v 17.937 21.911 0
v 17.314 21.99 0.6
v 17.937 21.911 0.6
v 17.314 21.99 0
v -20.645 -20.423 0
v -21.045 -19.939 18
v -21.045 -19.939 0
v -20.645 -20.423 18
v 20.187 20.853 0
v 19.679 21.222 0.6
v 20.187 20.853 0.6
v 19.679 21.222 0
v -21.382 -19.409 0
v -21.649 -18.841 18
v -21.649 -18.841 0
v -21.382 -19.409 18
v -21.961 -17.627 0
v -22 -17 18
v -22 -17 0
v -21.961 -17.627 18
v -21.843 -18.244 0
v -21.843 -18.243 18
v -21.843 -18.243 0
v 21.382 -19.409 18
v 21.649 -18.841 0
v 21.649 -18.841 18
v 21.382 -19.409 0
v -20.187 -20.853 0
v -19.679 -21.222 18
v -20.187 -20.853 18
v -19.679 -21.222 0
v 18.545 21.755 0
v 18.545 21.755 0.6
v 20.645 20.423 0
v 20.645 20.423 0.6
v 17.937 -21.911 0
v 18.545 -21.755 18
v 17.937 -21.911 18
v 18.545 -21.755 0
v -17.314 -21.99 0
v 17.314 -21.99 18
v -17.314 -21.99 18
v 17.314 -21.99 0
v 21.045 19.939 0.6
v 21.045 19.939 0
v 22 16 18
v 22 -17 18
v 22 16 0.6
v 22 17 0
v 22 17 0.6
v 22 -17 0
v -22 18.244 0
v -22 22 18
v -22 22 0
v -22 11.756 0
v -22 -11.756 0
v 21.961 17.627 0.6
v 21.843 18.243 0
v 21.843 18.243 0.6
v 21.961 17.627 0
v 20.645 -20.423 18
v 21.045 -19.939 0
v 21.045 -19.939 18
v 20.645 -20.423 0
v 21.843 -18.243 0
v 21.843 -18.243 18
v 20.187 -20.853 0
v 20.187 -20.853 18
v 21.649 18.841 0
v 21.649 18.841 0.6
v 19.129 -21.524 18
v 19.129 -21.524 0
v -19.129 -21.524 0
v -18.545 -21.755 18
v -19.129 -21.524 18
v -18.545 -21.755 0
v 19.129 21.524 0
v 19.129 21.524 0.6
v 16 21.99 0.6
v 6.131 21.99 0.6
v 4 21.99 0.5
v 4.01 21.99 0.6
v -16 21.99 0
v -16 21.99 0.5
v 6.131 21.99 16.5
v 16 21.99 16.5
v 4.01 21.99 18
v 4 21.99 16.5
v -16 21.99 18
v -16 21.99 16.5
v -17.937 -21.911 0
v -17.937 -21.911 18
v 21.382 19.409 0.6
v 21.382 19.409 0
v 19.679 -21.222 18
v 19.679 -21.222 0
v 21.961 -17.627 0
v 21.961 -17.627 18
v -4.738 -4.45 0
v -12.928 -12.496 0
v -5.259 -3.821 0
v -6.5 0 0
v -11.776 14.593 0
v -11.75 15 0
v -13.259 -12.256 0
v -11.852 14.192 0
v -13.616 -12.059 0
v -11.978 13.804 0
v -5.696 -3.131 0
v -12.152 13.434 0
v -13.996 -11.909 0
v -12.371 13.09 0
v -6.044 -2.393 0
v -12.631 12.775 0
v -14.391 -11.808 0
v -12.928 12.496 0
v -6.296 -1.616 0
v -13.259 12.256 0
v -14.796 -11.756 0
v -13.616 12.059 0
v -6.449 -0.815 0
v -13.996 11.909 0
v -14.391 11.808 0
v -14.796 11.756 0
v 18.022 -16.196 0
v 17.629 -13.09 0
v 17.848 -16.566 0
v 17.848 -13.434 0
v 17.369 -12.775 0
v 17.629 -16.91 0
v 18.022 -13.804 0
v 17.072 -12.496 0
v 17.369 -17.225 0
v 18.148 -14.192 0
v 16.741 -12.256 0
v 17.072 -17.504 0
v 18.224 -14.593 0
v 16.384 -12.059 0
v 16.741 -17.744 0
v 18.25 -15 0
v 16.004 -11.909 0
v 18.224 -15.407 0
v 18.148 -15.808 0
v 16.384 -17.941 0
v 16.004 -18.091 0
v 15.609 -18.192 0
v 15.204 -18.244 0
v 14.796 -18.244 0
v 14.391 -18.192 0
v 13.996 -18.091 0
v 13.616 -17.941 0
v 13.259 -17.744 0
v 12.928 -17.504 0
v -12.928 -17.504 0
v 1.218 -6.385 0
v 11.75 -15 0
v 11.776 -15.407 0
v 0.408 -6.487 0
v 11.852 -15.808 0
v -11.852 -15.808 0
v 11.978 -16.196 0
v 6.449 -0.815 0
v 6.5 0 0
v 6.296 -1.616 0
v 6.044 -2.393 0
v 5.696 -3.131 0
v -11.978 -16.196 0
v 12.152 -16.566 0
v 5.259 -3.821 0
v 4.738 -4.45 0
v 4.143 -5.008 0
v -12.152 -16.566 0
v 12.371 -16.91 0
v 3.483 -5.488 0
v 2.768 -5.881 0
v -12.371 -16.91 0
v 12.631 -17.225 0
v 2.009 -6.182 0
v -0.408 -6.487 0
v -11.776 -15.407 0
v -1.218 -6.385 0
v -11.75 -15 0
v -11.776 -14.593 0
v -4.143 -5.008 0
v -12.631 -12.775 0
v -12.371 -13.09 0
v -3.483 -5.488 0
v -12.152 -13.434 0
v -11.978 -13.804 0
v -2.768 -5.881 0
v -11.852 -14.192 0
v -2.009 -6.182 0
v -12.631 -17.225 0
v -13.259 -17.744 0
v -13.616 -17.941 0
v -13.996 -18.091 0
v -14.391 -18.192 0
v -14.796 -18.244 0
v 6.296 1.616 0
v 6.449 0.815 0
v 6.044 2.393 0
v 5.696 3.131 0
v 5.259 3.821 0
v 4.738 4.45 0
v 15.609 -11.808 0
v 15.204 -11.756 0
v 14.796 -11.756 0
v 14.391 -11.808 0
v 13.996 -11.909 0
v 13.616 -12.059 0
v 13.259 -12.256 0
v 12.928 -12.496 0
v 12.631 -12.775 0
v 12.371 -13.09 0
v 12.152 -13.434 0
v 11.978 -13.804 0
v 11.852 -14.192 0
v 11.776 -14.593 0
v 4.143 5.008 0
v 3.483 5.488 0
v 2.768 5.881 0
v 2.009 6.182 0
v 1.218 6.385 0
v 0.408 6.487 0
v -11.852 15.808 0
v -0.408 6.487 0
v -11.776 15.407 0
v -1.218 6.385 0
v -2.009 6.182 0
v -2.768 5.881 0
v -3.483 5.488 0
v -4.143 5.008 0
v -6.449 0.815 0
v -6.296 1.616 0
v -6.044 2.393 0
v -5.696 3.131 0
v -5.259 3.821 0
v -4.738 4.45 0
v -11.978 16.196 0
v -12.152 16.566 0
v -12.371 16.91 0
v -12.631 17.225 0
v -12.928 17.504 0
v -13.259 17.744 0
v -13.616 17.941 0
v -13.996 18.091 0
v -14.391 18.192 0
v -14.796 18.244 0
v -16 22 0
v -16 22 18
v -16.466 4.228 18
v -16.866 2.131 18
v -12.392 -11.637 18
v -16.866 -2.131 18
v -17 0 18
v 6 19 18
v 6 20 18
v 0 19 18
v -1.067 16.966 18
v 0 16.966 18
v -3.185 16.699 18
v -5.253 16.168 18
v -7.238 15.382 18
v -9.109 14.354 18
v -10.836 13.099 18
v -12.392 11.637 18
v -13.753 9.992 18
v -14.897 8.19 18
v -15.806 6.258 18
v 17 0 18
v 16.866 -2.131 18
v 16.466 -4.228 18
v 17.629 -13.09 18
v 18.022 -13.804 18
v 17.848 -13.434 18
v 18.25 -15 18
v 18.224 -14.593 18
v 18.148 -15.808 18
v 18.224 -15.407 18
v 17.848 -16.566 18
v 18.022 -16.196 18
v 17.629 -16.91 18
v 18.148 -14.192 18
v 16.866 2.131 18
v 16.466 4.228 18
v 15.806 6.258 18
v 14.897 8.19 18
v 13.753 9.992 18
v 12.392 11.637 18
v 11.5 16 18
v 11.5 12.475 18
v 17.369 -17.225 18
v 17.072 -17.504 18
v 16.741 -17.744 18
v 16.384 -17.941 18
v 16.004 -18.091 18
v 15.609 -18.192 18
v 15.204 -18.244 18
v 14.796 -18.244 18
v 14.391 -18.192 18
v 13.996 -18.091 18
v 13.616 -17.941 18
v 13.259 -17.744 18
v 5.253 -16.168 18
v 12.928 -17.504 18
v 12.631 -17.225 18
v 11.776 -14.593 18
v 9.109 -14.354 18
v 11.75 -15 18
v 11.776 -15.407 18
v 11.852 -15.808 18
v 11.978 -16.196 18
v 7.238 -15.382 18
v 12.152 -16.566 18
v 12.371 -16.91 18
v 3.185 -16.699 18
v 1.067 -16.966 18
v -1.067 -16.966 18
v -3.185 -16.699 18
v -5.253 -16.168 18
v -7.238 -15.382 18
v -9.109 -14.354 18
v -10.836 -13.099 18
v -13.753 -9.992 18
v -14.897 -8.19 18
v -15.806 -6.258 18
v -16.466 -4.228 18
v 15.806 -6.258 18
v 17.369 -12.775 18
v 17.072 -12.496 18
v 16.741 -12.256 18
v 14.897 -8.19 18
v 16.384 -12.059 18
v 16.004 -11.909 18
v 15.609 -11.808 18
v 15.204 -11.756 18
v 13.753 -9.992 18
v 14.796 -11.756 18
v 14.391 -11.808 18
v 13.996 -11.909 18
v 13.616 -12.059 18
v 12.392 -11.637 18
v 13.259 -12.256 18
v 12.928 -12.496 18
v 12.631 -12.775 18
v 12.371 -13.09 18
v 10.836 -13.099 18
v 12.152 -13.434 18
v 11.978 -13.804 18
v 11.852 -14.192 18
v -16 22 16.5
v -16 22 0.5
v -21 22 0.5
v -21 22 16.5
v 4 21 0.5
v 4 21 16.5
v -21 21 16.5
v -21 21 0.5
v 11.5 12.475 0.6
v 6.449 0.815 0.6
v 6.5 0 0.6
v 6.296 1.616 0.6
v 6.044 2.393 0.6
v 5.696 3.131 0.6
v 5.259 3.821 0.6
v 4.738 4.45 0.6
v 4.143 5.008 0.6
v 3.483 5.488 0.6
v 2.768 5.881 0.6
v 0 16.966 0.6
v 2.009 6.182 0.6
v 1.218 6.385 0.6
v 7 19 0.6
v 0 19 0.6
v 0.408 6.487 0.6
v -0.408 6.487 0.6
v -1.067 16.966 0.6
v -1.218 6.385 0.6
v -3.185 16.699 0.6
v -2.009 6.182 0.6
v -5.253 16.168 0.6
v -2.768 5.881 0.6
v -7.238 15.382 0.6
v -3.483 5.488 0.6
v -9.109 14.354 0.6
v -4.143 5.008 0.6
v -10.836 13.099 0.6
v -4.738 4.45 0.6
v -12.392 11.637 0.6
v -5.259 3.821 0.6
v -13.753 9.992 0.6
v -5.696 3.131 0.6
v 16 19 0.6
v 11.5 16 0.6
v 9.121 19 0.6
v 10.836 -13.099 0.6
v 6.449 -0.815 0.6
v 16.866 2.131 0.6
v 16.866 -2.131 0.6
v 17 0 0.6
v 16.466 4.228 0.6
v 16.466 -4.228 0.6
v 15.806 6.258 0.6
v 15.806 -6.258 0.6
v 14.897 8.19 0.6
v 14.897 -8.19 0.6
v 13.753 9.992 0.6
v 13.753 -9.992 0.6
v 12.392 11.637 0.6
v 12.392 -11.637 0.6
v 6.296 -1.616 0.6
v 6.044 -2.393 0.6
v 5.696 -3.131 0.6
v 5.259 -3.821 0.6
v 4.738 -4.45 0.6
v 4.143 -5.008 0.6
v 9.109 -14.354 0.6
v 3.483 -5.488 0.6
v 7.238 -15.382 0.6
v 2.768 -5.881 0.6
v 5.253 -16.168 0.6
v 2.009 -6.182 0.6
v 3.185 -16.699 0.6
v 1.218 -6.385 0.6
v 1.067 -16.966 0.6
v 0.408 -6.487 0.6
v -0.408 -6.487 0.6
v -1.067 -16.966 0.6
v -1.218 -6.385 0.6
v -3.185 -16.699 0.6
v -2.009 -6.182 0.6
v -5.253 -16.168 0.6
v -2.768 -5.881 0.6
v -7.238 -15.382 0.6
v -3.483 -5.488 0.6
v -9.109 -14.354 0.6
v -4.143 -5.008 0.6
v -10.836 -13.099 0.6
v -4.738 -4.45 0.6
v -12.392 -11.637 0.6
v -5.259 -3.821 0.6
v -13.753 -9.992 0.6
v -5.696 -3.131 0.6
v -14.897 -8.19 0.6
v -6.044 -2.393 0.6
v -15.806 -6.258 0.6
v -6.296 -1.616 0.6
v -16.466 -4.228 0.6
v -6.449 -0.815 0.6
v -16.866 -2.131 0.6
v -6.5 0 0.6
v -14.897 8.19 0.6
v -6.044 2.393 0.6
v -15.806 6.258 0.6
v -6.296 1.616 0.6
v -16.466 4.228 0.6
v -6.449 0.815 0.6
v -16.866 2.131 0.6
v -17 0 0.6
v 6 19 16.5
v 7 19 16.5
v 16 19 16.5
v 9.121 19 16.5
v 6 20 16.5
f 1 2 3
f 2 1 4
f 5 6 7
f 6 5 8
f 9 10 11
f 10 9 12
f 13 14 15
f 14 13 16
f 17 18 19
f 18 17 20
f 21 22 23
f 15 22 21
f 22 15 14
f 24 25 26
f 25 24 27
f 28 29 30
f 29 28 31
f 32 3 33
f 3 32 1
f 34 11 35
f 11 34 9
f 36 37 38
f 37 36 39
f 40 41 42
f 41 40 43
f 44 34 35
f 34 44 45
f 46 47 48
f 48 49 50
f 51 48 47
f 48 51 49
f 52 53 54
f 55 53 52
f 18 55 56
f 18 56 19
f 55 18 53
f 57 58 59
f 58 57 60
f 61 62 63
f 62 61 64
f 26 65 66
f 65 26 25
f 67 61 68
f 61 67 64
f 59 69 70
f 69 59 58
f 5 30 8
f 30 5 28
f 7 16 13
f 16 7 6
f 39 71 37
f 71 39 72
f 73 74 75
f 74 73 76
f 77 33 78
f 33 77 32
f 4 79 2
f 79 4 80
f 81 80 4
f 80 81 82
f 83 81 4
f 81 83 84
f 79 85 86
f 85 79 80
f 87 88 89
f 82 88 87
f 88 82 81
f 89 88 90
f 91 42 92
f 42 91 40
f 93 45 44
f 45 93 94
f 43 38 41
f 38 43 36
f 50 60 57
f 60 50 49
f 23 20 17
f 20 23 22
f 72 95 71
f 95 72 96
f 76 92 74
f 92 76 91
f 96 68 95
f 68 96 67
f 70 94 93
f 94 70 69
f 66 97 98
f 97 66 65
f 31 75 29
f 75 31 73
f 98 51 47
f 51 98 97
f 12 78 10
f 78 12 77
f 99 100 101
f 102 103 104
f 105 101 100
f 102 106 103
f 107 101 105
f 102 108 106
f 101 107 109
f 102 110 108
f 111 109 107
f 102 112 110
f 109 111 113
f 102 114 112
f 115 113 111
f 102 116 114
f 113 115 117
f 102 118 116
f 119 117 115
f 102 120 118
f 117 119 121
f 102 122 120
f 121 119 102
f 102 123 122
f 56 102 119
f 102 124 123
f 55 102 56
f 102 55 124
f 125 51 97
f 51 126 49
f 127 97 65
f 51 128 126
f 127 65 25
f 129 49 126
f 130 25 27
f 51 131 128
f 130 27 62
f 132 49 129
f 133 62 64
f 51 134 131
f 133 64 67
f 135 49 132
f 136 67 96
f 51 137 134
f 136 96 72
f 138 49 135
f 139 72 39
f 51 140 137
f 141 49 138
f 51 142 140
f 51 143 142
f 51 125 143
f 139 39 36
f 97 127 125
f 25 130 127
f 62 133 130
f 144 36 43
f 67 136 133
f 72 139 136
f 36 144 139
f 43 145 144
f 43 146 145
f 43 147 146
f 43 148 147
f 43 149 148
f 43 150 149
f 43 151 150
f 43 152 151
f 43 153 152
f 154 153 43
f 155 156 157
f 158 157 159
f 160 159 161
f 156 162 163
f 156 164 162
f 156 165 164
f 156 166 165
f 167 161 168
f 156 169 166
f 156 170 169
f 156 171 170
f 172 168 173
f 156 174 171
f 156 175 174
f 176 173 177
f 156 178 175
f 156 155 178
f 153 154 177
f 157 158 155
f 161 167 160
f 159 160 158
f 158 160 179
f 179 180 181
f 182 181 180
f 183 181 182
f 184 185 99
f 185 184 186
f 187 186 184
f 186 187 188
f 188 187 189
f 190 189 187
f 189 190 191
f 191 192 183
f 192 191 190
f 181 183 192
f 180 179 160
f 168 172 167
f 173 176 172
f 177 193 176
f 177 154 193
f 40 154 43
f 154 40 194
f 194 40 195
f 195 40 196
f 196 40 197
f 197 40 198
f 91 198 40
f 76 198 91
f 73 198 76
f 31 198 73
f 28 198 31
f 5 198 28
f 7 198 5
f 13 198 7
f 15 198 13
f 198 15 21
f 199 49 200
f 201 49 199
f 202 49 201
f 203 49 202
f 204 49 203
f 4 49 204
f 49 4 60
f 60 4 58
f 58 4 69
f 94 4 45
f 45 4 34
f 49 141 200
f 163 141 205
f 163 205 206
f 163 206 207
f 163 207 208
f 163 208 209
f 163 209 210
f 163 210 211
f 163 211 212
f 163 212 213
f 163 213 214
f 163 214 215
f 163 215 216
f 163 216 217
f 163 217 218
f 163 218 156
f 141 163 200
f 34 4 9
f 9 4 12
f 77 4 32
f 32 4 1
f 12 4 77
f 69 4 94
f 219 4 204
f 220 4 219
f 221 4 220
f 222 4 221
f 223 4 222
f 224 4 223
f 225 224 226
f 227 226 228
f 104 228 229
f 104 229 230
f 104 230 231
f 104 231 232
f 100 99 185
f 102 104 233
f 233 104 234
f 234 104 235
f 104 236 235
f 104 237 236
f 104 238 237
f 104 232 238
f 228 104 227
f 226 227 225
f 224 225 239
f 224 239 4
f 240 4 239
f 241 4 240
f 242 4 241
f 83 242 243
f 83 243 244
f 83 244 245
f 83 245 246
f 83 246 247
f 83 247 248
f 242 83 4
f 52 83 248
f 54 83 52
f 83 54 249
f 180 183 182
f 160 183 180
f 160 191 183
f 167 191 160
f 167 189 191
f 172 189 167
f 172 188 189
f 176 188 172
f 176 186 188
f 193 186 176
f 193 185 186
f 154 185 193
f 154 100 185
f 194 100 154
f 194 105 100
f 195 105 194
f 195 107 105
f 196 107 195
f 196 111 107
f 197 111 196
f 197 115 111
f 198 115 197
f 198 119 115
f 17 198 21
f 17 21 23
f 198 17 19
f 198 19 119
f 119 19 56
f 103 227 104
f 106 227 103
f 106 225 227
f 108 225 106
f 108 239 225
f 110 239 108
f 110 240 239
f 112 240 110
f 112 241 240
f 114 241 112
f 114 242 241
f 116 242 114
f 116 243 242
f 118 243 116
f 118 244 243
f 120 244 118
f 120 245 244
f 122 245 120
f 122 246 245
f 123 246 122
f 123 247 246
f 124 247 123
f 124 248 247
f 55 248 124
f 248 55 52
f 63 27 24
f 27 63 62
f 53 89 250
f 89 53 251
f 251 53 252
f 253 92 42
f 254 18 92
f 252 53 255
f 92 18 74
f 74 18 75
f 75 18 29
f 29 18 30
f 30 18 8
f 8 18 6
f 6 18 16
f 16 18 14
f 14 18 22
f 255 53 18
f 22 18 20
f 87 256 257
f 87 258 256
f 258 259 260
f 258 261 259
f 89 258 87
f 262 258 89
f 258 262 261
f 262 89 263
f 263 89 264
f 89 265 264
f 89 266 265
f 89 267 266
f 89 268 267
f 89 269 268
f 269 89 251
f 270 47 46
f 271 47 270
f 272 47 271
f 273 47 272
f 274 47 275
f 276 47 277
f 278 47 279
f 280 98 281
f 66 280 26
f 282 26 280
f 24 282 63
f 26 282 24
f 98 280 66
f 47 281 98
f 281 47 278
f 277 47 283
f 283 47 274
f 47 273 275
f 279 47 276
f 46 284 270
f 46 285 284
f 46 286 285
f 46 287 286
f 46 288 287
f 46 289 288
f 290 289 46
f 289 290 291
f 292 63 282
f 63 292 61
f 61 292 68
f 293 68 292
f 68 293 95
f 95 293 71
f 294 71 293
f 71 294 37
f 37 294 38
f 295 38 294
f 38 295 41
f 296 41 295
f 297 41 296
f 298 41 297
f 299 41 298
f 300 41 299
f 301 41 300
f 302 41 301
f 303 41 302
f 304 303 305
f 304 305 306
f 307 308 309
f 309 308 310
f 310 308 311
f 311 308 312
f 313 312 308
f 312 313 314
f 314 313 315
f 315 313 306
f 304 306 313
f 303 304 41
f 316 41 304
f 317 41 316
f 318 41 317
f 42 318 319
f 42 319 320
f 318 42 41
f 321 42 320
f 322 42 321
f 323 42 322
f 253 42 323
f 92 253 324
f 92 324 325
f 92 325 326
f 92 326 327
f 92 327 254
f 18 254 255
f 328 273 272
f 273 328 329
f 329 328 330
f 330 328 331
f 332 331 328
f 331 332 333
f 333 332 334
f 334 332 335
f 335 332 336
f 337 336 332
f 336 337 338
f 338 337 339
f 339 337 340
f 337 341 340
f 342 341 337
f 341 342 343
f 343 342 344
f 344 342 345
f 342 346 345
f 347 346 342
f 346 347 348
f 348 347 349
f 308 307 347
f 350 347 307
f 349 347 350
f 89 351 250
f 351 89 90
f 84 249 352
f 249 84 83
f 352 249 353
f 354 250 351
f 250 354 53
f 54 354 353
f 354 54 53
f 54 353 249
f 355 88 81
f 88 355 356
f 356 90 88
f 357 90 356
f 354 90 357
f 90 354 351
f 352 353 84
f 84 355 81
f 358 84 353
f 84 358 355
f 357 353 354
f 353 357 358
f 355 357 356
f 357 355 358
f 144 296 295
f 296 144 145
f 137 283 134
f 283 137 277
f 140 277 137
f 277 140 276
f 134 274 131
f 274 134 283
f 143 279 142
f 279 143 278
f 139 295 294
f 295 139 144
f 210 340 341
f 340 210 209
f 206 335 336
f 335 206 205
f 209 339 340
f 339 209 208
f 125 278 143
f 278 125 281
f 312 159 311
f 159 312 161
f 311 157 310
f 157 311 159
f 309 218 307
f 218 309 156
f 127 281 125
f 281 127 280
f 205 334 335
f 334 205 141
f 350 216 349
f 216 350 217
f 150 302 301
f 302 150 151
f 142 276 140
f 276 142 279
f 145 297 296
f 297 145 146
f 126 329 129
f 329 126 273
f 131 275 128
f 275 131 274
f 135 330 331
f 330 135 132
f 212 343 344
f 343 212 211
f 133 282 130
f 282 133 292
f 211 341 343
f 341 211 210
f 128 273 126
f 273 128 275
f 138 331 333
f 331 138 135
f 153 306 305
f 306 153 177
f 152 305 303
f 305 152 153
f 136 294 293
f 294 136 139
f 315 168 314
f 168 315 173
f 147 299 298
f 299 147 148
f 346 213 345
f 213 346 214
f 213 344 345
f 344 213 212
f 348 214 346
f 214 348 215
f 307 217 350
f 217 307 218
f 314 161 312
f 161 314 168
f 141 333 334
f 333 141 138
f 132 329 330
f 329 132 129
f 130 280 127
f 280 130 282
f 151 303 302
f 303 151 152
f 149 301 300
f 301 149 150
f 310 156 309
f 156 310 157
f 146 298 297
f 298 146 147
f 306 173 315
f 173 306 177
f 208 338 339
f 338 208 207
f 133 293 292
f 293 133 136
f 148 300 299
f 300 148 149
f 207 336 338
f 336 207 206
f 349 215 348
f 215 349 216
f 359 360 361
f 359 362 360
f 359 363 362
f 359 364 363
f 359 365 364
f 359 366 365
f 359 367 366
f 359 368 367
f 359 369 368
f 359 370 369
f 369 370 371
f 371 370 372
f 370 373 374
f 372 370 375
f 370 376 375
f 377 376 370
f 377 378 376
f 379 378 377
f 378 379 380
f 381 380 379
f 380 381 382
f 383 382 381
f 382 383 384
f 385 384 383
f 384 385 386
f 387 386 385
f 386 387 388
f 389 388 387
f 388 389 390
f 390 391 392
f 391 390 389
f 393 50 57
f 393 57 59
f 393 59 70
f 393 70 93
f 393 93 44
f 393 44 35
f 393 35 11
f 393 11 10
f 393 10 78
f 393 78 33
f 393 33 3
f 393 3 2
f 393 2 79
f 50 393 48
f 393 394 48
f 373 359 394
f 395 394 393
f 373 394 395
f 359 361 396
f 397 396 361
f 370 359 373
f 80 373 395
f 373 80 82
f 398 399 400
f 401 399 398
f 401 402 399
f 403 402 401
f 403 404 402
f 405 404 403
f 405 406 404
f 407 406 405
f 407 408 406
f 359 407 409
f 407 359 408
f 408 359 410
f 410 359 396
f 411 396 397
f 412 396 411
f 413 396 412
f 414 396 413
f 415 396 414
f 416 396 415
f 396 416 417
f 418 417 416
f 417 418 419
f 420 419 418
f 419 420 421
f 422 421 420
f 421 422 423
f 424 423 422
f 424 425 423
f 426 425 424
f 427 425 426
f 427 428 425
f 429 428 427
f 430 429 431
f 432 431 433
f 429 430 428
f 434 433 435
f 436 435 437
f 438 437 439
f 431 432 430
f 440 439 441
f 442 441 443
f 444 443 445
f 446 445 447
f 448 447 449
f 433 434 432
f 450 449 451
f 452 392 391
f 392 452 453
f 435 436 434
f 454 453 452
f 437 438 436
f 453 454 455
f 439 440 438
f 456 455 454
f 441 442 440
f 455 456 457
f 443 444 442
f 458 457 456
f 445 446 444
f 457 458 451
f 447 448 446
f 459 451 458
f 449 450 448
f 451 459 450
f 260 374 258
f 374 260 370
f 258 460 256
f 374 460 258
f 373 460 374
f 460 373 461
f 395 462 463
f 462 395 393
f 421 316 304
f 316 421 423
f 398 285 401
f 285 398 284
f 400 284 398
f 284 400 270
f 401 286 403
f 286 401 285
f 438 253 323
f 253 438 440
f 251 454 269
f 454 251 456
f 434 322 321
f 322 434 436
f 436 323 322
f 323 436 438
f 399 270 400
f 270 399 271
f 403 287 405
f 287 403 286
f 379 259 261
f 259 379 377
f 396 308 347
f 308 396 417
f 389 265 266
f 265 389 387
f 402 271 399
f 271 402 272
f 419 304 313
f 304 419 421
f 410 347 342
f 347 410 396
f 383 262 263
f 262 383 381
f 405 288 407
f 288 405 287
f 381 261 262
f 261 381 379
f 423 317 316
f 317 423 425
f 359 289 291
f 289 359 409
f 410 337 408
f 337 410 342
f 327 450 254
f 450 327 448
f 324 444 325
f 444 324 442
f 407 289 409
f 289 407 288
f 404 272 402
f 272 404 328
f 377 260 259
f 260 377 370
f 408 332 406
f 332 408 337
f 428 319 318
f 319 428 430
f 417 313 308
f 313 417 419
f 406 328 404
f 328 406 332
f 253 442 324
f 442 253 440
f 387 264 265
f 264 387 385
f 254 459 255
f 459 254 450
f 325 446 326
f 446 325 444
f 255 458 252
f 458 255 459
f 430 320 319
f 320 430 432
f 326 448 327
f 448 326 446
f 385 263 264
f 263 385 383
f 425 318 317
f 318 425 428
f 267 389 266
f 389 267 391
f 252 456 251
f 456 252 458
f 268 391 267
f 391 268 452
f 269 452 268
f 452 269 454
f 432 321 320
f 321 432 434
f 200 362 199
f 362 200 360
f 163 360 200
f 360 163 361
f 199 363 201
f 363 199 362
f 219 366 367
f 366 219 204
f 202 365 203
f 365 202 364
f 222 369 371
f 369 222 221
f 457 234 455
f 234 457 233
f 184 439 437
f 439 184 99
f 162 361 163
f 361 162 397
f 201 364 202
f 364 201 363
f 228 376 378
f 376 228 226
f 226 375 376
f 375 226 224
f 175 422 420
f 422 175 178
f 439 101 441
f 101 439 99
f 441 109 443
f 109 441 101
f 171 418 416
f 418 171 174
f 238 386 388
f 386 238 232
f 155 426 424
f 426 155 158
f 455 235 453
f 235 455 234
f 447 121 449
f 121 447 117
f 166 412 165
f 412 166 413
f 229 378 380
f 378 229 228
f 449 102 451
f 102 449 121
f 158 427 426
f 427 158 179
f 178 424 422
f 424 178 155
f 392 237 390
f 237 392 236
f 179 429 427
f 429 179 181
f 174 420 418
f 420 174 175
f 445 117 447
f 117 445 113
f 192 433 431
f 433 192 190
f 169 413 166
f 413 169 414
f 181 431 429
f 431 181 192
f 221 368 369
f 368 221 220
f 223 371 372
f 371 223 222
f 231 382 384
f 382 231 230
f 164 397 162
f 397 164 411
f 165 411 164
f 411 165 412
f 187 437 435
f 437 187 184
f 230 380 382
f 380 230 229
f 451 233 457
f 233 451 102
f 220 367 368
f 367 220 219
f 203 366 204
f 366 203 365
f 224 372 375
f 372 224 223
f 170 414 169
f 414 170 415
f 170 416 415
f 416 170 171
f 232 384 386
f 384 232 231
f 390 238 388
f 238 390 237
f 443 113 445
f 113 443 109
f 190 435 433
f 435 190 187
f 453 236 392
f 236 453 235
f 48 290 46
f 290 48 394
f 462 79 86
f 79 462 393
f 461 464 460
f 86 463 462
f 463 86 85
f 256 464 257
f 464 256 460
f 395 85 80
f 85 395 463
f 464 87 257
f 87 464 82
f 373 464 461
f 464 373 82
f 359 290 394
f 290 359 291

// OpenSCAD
$fn = 50;


difference() {
	union() {
		hull() {
			translate(v = [-17.0000000000, 17.0000000000, 0]) {
				cylinder(h = 18, r = 5);
			}
			translate(v = [17.0000000000, 17.0000000000, 0]) {
				cylinder(h = 18, r = 5);
			}
			translate(v = [-17.0000000000, -17.0000000000, 0]) {
				cylinder(h = 18, r = 5);
			}
			translate(v = [17.0000000000, -17.0000000000, 0]) {
				cylinder(h = 18, r = 5);
			}
		}
		translate(v = [-22.0000000000, 16.0000000000, 0]) {
			cube(size = [6, 6, 18]);
		}
	}
	union() {
		translate(v = [-22.5000000000, -15.0000000000, -250.0000000000]) {
			rotate(a = [0, 0, 0]) {
				difference() {
					union() {
						hull() {
							translate(v = [7.5000000000, 0, 0]) {
								cylinder(h = 250, r = 3.2500000000, r1 = 3.2500000000, r2 = 3.2500000000);
							}
							translate(v = [-7.5000000000, 0, 0]) {
								cylinder(h = 250, r = 3.2500000000, r1 = 3.2500000000, r2 = 3.2500000000);
							}
						}
					}
					union();
				}
			}
		}
		translate(v = [-22.5000000000, 15.0000000000, -250.0000000000]) {
			rotate(a = [0, 0, 0]) {
				difference() {
					union() {
						hull() {
							translate(v = [7.5000000000, 0, 0]) {
								cylinder(h = 250, r = 3.2500000000, r1 = 3.2500000000, r2 = 3.2500000000);
							}
							translate(v = [-7.5000000000, 0, 0]) {
								cylinder(h = 250, r = 3.2500000000, r1 = 3.2500000000, r2 = 3.2500000000);
							}
						}
					}
					union();
				}
			}
		}
		translate(v = [-21.0000000000, 21.0000000000, 0.5000000000]) {
			cube(size = [25, 1, 16]);
		}
		translate(v = [15.0000000000, -15.0000000000, -50.0000000000]) {
			cylinder(h = 100, r = 3.2500000000);
		}
		translate(v = [0.0000000000, 11.0000000000, 0.6000000000]) {
			cube(size = [11, 8, 20.4000000000]);
		}
		translate(v = [0, 0, 0.6000000000]) {
			cylinder(h = 20.4000000000, r = 17.0000000000);
		}
		translate(v = [0, 0, -9.0000000000]) {
			cylinder(h = 18, r = 6.5000000000);
		}
		translate(v = [0.0000000000, 16.0000000000, 0.6000000000]) {
			cube(size = [22.0000000000, 3, 20.4000000000]);
		}
		translate(v = [16.0000000000, 16.0000000000, 0.6000000000]) {
			cube(size = [6, 6, 20.4000000000]);
		}
		translate(v = [6.0000000000, 16.0000000000, 16.5000000000]) {
			cube(size = [16, 6, 1.5000000000]);
		}
		translate(v = [3.2500000000, 22.7500000000, 0.6000000000]) {
			rotate(a = [0, 0, -45]) {
				cube(size = [7.5000000000, 1.5000000000, 20.4000000000]);
			}
		}
		translate(v = [2.5000000000, 11.0000000000, 0.6000000000]) {
			cube(size = [9.0000000000, 5, 17.4000000000]);
		}
	}
}
